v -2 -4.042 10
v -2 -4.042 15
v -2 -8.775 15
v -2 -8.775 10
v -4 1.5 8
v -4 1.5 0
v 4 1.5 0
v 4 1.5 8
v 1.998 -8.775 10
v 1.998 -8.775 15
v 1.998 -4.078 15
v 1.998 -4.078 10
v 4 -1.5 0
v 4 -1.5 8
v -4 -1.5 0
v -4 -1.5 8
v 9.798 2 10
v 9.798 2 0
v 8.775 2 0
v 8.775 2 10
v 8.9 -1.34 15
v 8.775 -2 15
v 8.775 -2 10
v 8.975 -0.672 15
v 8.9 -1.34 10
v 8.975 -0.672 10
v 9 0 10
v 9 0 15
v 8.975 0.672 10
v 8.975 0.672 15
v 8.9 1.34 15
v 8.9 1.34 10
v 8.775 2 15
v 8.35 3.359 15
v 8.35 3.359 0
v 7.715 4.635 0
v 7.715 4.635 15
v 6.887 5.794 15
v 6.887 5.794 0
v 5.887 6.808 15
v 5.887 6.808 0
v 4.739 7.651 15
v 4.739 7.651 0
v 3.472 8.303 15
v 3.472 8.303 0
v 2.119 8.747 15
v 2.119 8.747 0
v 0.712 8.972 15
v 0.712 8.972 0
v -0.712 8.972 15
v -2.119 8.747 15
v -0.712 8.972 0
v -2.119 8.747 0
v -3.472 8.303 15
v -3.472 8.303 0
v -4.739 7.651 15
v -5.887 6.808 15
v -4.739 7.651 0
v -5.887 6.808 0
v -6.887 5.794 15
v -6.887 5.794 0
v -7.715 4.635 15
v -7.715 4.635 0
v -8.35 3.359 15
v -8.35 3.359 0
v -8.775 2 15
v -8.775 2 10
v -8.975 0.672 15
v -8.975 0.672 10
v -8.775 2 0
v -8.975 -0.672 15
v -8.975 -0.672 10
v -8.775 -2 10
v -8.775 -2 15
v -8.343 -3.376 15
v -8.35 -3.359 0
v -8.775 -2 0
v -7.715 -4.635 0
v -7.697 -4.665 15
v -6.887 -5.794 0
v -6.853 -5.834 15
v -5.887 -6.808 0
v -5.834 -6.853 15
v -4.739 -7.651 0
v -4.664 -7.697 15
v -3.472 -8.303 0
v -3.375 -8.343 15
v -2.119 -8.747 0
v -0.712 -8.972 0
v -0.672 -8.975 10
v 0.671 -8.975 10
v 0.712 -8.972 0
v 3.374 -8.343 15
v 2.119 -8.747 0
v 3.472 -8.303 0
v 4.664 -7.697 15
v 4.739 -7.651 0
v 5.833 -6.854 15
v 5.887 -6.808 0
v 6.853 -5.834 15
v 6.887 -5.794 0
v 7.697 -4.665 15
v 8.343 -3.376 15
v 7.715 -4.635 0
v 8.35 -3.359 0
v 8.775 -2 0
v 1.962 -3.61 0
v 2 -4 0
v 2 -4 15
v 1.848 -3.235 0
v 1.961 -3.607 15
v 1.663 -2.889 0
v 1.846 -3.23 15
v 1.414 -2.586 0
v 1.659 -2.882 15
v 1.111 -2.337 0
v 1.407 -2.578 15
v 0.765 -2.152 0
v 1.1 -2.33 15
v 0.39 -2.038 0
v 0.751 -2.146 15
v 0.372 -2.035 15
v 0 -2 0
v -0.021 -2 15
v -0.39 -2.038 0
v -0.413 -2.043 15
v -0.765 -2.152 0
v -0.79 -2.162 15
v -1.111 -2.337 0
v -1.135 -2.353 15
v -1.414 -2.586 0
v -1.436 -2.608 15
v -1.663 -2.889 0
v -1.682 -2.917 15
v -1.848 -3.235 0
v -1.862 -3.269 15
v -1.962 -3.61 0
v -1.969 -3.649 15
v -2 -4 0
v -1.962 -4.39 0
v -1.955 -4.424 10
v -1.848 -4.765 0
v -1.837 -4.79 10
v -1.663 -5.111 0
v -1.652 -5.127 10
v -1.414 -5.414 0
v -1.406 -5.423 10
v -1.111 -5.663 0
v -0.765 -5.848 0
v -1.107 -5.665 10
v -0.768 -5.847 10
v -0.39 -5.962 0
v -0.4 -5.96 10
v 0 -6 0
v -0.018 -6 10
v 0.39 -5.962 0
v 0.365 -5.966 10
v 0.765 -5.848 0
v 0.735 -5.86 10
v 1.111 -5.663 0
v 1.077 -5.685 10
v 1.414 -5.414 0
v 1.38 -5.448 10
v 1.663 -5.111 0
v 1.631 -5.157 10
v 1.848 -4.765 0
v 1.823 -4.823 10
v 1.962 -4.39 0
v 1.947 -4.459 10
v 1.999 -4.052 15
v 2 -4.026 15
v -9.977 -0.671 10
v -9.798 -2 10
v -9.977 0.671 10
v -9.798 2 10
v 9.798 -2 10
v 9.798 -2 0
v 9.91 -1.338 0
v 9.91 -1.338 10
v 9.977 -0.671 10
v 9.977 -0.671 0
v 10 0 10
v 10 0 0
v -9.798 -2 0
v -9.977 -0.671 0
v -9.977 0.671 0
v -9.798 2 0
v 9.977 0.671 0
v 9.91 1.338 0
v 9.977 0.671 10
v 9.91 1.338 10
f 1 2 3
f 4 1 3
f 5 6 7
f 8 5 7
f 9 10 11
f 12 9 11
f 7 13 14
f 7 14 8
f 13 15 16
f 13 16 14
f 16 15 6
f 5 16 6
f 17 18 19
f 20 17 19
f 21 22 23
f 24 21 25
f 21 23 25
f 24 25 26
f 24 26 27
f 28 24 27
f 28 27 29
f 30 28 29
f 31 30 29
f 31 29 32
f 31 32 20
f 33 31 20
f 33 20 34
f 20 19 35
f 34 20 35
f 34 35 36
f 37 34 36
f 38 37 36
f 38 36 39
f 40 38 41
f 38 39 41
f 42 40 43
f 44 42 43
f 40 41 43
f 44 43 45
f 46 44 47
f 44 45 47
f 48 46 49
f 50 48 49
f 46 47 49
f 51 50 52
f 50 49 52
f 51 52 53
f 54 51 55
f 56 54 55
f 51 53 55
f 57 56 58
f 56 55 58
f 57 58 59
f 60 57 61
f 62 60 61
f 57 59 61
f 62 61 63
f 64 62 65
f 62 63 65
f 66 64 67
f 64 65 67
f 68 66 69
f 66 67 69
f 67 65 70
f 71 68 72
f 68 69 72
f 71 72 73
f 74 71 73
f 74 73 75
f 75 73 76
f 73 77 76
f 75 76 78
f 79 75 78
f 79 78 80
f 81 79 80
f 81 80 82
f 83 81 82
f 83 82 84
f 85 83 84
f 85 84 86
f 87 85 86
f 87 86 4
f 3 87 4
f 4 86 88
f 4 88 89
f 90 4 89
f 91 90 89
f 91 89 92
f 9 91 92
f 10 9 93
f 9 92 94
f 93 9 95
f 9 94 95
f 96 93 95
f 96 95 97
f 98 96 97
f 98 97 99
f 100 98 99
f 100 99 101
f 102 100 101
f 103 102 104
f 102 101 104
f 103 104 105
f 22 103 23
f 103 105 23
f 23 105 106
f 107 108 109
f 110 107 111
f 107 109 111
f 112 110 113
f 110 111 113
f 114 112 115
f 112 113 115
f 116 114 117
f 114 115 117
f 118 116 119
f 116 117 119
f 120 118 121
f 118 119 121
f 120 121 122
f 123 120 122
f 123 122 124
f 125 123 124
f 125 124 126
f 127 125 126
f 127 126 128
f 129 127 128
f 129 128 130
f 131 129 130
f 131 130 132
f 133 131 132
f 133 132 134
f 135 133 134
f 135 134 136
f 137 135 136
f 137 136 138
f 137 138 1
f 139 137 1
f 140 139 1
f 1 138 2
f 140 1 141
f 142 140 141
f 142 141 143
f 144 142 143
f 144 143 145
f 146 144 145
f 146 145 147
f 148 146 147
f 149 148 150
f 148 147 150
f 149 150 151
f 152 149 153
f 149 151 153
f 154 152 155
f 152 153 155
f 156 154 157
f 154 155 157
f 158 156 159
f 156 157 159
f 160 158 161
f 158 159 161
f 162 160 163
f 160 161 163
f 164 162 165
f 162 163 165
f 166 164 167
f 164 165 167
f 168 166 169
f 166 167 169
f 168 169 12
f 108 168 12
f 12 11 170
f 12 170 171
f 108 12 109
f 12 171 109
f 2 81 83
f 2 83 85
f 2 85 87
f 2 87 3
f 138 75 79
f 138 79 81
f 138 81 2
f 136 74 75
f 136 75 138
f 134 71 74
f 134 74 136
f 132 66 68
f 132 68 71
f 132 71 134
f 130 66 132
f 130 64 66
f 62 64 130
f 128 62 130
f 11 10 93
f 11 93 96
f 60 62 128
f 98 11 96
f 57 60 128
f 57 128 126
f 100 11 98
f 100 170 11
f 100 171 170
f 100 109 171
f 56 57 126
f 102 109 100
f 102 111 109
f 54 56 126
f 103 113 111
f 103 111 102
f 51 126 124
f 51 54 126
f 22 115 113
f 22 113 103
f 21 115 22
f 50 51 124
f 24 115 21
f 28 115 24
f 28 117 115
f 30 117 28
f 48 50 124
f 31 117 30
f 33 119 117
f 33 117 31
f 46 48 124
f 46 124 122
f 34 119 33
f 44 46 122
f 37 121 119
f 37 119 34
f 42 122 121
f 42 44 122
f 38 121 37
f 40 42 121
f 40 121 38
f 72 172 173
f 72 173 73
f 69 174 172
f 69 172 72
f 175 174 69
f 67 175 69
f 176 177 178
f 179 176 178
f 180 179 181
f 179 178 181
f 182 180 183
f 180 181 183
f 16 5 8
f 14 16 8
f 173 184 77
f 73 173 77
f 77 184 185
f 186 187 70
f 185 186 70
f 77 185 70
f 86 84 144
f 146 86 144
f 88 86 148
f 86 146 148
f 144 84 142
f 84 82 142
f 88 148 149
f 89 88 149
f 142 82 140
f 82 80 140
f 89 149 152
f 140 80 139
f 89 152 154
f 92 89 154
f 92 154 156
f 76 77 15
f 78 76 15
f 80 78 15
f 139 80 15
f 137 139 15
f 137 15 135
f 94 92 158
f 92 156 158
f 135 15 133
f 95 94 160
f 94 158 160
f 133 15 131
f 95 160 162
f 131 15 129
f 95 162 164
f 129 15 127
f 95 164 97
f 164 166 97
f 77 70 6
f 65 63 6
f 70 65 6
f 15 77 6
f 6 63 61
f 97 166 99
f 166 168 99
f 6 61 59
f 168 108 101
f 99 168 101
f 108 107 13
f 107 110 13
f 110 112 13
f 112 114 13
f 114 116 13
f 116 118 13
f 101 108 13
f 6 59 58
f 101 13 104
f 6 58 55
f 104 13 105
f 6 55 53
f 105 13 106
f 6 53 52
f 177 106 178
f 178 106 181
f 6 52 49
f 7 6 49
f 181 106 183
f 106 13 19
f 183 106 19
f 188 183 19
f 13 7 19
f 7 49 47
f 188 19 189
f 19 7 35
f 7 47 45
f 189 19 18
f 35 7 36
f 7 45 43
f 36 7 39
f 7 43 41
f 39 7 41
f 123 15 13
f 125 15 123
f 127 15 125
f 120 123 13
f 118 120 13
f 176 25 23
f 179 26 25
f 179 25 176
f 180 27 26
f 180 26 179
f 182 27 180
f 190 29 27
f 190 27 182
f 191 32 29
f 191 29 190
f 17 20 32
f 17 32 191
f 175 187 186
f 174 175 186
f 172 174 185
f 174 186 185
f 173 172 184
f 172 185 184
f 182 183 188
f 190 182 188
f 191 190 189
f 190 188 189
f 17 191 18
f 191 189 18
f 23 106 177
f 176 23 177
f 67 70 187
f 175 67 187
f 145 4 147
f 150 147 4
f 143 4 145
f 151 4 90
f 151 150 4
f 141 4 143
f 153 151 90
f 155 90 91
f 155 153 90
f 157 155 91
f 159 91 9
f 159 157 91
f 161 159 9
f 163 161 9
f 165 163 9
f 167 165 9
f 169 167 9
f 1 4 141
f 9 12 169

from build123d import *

# Parameters (mm, degrees)
F1_DEPTH = 10
F2_DEPTH = 15
F3_W     = 8
F3_H     = 3
F4_DEPTH = 8
F5_R     = 2
F6_DEPTH = 25
F8_DEPTH = 5


with BuildPart() as f1:
    # F0 (on Top) → F1 (new body)
    with BuildSketch(Plane.XY):
        with BuildLine():
            Line((-8.7749643874, 2), (-9.7979589711, 2))
            ThreePointArc((-9.7979589711, 2), (-10, 0), (-9.7979589711, -2))
            Line((-9.7979589711, -2), (-8.7749643874, -2))
            ThreePointArc((-8.7749643874, -2), (-9, 0), (-8.7749643874, 2))
        make_face()
        with BuildLine():
            ThreePointArc((9.7979589711, -2), (9.9493615301, -1.0050896201), (10, 0))
            ThreePointArc((10, 0), (9.9493615301, 1.0050896201), (9.7979589711, 2))
            Line((9.7979589711, 2), (8.7749643874, 2))
            ThreePointArc((8.7749643874, 2), (8.9435641521, 1.0063102189), (9, 0))
            ThreePointArc((9, 0), (8.9435641521, -1.0063102189), (8.7749643874, -2))
            Line((8.7749643874, -2), (9.7979589711, -2))
        make_face()
        with BuildLine():
            ThreePointArc((9, 0), (8.9435641521, 1.0063102189), (8.7749643874, 2))
            Line((8.7749643874, 2), (-8.7749643874, 2))
            ThreePointArc((-8.7749643874, 2), (-9, 0), (-8.7749643874, -2))
            Line((-8.7749643874, -2), (8.7749643874, -2))
            ThreePointArc((8.7749643874, -2), (8.9435641521, -1.0063102189), (9, 0))
        make_face()
        with BuildLine():
            Line((-8.7749643874, 2), (8.7749643874, 2))
            ThreePointArc((8.7749643874, 2), (0, 9), (-8.7749643874, 2))
        make_face()
        with BuildLine():
            ThreePointArc((-8.7749643874, -2), (0, -9), (8.7749643874, -2))
            Line((8.7749643874, -2), (-8.7749643874, -2))
        make_face()
    extrude(amount=F1_DEPTH)

    # F0 (on Top) → F2 (join)
    with BuildSketch(Plane.XY):
        with BuildLine():
            ThreePointArc((9, 0), (8.9435641521, 1.0063102189), (8.7749643874, 2))
            Line((8.7749643874, 2), (-8.7749643874, 2))
            ThreePointArc((-8.7749643874, 2), (-9, 0), (-8.7749643874, -2))
            Line((-8.7749643874, -2), (8.7749643874, -2))
            ThreePointArc((8.7749643874, -2), (8.9435641521, -1.0063102189), (9, 0))
        make_face()
        with BuildLine():
            Line((-8.7749643874, 2), (8.7749643874, 2))
            ThreePointArc((8.7749643874, 2), (0, 9), (-8.7749643874, 2))
        make_face()
        with BuildLine():
            ThreePointArc((-8.7749643874, -2), (0, -9), (8.7749643874, -2))
            Line((8.7749643874, -2), (-8.7749643874, -2))
        make_face()
    extrude(amount=F2_DEPTH)

    # F3 (on face) → F4 (cut)
    with BuildSketch(Plane.XY):
        Rectangle(F3_W, F3_H)
    extrude(amount=F4_DEPTH, mode=Mode.SUBTRACT)

    # F5 (on face) → F6 (cut)
    with BuildSketch(Plane.XY.offset(15)):
        with Locations((0, -4)):
            Circle(F5_R)
    extrude(amount=-F6_DEPTH, mode=Mode.SUBTRACT)

    # F7 (on face) → F8 (cut)
    with BuildSketch(Plane.XY.offset(15)):
        with BuildLine():
            ThreePointArc((1.9984808879, -4.0779367749), (-0.0179678096, -5.9999192878), (-1.9995585875, -4.0420173194))
            Line((-1.9995585875, -4.0420173194), (-1.9995585875, -8.775064983))
            ThreePointArc((-1.9995585875, -8.775064983), (-0.0005526547, -8.999999983), (1.9984808879, -8.7753104869))
            Line((1.9984808879, -8.7753104869), (1.9984808879, -4.0779367749))
        make_face()
    extrude(amount=-F8_DEPTH, mode=Mode.SUBTRACT)


solid = f1.part
